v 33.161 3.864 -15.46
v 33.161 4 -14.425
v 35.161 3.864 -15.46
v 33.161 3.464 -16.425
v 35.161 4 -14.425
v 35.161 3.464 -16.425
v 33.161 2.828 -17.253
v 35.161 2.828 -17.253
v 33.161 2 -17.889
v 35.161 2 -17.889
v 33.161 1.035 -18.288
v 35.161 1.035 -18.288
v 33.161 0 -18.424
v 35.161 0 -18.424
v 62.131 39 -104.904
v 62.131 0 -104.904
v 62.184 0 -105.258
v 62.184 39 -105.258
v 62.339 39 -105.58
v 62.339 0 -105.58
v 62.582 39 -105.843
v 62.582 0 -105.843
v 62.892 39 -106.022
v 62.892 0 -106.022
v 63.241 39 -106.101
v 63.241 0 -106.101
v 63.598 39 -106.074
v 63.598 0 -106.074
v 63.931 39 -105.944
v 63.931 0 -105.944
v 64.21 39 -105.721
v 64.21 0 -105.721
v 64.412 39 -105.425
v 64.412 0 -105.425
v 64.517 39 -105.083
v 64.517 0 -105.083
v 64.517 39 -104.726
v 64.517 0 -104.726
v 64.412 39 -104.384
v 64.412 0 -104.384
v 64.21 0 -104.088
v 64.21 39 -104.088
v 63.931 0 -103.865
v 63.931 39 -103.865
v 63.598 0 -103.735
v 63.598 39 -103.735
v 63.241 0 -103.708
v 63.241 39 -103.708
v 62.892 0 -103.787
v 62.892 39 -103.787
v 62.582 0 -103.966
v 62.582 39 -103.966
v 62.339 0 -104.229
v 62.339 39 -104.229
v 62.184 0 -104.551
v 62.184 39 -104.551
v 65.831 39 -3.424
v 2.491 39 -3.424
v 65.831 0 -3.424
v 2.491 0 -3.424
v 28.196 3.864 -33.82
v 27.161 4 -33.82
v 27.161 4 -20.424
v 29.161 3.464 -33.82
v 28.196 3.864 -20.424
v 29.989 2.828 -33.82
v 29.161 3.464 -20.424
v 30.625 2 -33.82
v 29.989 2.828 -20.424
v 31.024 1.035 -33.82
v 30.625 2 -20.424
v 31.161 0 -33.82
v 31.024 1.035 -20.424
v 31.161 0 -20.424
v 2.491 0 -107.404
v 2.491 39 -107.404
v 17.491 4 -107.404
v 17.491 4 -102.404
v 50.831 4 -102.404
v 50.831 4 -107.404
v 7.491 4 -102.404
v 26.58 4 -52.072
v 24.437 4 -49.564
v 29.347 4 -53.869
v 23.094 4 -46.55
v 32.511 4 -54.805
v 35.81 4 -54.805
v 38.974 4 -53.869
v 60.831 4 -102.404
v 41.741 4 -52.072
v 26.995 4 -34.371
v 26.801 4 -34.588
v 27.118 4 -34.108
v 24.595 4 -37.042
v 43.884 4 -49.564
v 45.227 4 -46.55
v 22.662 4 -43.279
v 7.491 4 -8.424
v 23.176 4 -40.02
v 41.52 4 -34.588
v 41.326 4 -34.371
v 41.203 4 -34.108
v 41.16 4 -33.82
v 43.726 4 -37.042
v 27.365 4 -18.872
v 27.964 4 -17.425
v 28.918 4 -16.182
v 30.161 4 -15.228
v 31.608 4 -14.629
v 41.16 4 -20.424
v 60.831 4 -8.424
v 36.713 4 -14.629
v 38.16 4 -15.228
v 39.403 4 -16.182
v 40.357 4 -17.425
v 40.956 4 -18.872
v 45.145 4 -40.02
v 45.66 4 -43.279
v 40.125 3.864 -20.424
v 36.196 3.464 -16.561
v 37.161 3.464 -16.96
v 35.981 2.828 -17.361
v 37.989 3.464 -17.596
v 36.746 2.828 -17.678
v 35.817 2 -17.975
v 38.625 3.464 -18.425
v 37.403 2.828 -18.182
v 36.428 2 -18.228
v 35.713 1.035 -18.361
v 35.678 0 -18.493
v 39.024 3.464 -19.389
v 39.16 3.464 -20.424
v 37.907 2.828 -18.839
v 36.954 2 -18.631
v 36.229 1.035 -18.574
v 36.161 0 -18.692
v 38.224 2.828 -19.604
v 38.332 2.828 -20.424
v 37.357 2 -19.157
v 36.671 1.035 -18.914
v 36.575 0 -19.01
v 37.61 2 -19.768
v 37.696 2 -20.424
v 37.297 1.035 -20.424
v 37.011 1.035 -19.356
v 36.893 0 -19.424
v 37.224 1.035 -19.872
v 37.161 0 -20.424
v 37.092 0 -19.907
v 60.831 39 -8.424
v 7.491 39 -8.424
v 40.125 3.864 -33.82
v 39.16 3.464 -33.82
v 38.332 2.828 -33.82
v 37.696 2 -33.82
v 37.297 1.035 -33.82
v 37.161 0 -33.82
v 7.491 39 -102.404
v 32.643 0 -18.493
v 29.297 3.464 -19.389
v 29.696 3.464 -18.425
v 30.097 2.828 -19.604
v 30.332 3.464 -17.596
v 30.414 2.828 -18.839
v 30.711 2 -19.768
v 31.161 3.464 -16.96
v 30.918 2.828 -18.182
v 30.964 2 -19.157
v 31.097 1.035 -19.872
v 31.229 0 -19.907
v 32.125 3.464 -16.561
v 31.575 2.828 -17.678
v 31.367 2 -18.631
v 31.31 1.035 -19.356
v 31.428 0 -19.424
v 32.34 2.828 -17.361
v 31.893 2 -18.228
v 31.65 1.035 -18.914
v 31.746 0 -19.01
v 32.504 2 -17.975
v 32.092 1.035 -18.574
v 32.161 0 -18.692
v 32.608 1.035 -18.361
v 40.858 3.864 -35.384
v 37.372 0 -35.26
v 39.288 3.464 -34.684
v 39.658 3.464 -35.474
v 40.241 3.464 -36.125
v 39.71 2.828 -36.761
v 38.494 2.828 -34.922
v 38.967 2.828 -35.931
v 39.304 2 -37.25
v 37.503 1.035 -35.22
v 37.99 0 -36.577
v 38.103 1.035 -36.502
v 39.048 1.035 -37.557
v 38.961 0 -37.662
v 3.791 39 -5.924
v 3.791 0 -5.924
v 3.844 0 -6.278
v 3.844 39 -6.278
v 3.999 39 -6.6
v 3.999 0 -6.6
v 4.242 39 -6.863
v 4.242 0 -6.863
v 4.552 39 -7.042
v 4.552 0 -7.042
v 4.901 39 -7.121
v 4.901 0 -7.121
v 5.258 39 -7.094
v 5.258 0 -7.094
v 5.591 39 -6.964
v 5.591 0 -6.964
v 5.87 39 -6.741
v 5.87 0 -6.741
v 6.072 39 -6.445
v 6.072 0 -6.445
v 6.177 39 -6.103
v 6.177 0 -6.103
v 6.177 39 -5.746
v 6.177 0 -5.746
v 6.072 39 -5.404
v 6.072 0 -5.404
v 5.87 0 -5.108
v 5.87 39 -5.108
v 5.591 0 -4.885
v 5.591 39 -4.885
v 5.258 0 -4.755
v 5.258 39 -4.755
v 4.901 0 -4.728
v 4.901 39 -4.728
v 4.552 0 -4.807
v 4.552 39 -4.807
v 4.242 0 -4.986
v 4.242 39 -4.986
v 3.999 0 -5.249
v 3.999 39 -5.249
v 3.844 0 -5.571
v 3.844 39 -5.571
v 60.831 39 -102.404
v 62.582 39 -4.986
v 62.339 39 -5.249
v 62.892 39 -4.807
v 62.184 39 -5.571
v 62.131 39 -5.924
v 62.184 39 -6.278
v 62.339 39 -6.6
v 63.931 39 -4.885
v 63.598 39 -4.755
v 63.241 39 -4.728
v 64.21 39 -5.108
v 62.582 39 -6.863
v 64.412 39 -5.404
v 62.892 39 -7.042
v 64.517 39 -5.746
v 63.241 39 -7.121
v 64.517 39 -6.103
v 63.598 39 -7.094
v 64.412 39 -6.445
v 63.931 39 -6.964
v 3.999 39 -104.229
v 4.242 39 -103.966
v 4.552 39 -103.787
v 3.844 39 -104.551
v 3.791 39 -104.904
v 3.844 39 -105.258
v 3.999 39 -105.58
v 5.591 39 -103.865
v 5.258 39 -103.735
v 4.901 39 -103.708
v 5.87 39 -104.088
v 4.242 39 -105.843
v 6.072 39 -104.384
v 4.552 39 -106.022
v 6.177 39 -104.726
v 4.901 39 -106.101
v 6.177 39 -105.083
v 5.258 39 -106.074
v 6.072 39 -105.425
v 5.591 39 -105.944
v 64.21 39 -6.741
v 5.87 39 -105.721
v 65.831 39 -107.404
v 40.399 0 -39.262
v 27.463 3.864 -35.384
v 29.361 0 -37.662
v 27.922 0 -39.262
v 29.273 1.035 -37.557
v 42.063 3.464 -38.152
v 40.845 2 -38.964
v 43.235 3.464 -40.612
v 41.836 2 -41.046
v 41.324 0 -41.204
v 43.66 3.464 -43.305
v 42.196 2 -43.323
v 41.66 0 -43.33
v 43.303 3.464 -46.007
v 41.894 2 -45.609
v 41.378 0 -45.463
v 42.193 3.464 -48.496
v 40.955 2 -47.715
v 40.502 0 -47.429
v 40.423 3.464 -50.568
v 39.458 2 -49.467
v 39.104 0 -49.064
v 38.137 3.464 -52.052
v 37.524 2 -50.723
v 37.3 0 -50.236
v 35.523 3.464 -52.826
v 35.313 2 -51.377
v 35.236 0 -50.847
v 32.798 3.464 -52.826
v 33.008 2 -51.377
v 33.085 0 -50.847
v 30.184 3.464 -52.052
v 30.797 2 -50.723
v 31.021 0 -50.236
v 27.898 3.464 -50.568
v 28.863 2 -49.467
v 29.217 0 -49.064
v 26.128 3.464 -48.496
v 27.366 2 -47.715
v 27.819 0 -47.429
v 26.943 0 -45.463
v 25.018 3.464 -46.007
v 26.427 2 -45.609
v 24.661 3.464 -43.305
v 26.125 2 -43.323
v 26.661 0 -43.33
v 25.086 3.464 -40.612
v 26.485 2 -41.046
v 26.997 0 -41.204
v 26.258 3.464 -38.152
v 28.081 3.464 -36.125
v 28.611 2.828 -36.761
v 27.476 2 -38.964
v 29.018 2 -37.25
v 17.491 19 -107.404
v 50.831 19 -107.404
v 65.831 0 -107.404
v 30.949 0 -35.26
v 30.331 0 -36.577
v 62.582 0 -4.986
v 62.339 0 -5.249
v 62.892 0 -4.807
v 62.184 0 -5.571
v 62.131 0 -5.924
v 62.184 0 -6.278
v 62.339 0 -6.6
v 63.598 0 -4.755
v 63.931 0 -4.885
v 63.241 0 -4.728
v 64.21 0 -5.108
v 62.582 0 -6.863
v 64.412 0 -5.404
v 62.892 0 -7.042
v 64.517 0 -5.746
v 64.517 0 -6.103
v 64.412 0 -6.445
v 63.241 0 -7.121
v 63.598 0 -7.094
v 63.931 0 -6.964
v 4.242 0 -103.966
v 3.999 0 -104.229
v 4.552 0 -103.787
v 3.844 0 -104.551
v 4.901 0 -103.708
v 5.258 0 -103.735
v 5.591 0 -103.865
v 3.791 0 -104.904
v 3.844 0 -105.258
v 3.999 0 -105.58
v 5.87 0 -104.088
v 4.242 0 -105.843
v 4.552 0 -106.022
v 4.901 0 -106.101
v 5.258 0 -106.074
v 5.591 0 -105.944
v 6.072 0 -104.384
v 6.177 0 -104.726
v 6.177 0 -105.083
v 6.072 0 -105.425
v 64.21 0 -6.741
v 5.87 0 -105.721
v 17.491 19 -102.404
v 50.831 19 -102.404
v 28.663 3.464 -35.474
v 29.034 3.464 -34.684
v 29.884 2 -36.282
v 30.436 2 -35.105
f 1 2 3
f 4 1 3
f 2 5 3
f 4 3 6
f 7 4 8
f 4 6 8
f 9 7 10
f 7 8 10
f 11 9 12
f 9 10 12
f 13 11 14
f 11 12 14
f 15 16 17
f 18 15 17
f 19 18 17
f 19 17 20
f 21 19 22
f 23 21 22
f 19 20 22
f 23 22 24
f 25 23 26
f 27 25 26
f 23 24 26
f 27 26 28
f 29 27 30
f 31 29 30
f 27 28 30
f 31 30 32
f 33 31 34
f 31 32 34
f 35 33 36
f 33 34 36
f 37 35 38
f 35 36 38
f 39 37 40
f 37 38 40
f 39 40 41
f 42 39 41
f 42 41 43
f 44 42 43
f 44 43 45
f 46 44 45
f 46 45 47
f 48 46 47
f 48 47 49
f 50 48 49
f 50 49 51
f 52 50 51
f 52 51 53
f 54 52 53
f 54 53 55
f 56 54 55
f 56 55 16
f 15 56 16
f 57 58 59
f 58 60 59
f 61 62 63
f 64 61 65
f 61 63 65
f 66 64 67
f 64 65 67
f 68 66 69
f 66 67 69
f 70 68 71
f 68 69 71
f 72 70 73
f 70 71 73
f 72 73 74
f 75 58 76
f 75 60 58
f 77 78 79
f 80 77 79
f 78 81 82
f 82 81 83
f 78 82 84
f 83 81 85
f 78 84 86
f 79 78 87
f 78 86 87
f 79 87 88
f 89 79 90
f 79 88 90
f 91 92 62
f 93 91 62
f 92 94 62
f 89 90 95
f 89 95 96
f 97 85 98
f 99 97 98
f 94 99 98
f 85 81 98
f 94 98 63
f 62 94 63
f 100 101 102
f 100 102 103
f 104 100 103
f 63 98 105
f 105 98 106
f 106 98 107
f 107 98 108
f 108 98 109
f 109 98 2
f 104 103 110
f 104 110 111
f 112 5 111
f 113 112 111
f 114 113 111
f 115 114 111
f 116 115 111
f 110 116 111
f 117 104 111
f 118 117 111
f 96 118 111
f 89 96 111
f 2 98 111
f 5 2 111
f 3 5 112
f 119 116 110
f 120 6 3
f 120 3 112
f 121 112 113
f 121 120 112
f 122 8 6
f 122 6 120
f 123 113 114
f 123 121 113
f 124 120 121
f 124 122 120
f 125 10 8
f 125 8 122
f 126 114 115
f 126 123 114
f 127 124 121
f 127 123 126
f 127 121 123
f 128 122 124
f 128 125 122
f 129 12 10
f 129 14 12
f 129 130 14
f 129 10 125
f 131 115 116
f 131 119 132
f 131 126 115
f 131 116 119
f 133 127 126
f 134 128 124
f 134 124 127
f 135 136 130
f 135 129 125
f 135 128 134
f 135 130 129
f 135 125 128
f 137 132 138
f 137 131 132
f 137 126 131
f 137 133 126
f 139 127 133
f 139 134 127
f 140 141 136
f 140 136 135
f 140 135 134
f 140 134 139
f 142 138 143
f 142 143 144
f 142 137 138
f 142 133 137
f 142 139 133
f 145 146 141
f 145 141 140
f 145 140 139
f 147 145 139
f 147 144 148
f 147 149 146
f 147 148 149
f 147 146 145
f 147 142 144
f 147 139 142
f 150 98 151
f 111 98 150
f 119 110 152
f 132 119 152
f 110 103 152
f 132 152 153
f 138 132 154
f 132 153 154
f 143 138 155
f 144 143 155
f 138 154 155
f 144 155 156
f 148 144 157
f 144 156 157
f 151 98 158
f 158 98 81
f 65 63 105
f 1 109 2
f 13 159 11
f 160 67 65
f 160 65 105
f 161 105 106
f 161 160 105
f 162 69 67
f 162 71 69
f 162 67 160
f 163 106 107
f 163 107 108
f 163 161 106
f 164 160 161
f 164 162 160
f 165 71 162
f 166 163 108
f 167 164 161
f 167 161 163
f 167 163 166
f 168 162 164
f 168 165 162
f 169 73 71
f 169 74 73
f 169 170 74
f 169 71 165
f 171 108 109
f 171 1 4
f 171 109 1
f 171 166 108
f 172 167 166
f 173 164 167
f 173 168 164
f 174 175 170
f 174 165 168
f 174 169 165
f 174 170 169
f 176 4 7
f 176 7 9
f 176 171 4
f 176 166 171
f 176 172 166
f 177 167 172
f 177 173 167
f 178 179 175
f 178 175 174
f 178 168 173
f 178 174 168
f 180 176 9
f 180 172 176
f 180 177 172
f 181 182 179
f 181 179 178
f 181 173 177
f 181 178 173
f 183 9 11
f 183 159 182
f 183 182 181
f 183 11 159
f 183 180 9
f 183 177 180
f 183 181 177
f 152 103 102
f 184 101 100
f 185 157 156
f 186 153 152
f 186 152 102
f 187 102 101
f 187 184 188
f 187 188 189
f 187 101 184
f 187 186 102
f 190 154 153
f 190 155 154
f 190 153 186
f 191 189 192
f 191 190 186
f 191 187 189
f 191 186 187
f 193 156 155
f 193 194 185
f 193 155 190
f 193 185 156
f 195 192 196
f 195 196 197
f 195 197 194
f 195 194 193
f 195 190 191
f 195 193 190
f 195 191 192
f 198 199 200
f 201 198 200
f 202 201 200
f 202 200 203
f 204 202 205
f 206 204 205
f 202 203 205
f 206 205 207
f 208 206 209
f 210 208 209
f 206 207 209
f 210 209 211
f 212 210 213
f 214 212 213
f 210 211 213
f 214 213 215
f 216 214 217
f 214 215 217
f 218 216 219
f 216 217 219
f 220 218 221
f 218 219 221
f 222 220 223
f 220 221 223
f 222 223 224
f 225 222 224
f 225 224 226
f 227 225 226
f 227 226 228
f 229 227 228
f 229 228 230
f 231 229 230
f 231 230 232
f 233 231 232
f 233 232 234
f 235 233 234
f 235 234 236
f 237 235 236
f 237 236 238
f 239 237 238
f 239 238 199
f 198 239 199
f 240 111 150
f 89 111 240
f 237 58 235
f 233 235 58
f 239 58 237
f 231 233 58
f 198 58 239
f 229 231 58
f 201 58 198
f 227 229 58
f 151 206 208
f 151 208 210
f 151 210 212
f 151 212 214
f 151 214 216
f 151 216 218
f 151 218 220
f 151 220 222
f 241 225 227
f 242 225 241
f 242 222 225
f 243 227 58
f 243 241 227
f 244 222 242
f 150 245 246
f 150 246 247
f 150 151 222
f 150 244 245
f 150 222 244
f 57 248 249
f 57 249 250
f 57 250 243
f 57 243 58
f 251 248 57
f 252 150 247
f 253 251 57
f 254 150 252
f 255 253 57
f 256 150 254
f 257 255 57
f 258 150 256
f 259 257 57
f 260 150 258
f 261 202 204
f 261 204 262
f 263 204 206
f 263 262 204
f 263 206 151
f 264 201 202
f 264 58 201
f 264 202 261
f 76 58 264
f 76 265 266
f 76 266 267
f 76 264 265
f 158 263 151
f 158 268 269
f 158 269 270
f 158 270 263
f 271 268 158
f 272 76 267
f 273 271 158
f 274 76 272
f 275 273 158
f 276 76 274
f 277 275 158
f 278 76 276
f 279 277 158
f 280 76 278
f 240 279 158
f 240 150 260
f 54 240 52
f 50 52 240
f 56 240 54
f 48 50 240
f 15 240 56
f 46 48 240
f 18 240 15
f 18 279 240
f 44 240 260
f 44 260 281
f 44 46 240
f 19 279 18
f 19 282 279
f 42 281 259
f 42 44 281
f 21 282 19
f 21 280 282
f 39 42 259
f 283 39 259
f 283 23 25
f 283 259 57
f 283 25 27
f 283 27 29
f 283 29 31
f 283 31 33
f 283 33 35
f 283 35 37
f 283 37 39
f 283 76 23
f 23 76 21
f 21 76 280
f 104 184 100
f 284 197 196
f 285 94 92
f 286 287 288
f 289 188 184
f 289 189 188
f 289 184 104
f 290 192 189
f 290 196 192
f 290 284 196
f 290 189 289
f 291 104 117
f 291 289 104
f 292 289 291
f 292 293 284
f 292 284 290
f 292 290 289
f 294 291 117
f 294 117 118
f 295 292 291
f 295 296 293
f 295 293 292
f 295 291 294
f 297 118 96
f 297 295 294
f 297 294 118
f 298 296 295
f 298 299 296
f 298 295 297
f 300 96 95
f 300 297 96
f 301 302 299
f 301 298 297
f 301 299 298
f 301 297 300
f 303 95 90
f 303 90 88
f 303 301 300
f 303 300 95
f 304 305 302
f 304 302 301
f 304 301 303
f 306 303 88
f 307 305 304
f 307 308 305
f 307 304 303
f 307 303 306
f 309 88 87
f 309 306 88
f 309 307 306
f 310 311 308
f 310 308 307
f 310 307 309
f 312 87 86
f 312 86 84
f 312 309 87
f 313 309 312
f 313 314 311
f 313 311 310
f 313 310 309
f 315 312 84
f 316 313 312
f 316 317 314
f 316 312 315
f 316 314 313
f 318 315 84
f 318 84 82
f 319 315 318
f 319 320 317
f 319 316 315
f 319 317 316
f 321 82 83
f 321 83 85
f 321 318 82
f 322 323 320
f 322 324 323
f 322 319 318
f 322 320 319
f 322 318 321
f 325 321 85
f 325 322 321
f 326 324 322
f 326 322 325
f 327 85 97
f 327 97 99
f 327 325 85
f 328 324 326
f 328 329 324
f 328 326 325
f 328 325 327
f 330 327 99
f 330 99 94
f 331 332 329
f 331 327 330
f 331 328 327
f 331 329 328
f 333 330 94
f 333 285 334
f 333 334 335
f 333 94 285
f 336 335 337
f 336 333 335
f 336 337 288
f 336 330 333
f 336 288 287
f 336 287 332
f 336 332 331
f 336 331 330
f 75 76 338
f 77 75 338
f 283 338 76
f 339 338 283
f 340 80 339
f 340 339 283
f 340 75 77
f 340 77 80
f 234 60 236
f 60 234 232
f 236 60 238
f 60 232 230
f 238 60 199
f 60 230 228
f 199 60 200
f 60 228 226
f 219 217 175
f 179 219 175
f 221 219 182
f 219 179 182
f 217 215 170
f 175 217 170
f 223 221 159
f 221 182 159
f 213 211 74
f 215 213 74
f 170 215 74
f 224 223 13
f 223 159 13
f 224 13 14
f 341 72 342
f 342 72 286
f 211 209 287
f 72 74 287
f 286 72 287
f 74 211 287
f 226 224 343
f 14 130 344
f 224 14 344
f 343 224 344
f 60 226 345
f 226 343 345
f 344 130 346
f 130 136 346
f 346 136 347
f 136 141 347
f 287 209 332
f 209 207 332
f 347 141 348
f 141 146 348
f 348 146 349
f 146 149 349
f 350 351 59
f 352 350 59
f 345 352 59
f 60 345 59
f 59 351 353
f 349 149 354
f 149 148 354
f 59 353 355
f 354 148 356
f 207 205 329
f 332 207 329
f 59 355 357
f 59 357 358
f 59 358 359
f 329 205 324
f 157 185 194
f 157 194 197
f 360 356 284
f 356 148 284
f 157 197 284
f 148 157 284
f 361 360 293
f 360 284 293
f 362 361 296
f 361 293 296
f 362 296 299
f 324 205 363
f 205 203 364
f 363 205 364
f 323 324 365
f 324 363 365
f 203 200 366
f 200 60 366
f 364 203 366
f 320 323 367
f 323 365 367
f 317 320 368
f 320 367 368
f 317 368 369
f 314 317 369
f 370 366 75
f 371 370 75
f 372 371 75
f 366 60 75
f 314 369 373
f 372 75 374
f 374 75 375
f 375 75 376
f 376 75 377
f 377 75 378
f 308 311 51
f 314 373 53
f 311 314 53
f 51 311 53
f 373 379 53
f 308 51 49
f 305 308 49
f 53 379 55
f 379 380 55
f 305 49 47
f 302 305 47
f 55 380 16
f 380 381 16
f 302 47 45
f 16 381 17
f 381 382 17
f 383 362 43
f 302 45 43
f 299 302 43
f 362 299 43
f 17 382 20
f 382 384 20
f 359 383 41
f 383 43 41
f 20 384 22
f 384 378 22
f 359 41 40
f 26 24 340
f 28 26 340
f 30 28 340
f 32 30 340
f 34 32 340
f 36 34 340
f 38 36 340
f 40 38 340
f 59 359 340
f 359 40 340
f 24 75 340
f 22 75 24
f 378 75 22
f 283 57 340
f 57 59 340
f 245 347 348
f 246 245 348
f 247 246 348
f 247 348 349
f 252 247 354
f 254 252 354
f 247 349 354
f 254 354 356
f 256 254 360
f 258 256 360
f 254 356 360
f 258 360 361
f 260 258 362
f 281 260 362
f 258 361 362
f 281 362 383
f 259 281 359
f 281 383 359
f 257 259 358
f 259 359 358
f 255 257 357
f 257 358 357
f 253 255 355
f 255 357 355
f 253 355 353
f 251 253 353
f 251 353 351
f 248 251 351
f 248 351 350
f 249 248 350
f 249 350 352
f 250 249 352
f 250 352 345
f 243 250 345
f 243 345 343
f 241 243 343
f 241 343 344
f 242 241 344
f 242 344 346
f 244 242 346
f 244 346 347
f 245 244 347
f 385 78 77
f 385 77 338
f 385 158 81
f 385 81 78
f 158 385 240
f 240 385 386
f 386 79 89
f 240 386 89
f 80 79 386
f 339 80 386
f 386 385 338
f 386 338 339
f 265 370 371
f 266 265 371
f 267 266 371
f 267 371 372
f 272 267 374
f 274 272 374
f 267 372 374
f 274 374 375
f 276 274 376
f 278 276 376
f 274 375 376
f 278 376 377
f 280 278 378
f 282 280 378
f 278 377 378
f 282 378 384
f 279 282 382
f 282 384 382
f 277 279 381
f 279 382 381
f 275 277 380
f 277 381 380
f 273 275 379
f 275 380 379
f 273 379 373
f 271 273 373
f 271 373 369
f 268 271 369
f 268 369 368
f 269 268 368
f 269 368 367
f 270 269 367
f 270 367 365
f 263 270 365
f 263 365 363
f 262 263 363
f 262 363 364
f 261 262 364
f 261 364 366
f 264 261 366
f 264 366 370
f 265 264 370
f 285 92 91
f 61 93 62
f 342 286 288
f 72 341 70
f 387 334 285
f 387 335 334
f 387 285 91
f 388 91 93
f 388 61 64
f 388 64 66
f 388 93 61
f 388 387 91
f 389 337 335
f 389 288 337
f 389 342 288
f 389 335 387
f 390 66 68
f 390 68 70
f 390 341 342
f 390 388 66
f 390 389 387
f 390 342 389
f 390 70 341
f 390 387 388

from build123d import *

# Parameters (mm, degrees)
SCHIZZO1_W                   = 63.34
SCHIZZO1_H                   = 103.98
ESTRUSIONE_ESTRUSIONE1_DEPTH = 4
SCHIZZO2_W                   = 63.34
SCHIZZO2_H                   = 103.98
SCHIZZO2_W_2                 = 53.34
SCHIZZO2_H_2                 = 93.98
ESTRUSIONE_ESTRUSIONE2_DEPTH = 35
FORO_PER_VITE_M2_1_D         = 2.4
SCHIZZO5_W                   = 33.34
SCHIZZO5_H                   = 15
TAGLIO_ESTRUSIONE1_DEPTH     = 126.106755432
TAGLIO_ESTRUSIONE2_DEPTH     = 132.87260726
RACCORDO1_R                  = 4


with BuildPart() as part:
    # Schizzo1 → Estrusione-Estrusione1 (new body)
    with BuildSketch(Plane(origin=(0, 0, 0), x_dir=(1, 0, 0), z_dir=(0, 1, 0))):
        with Locations((34.160538922, 55.414491018)):
            Rectangle(SCHIZZO1_W, SCHIZZO1_H)
    extrude(amount=ESTRUSIONE_ESTRUSIONE1_DEPTH)

    # Schizzo2 → Estrusione-Estrusione2 (add)
    with BuildSketch(Plane(origin=(0, 4, 0), x_dir=(1, 0, 0), z_dir=(0, 1, 0))):
        with Locations((34.160538922, 55.414491018)):
            Rectangle(SCHIZZO2_W, SCHIZZO2_H)
        with Locations((34.160538922, 55.414491018)):
            Rectangle(SCHIZZO2_W_2, SCHIZZO2_H_2, mode=Mode.SUBTRACT)
    extrude(amount=ESTRUSIONE_ESTRUSIONE2_DEPTH)

    # Foro per Vite M2-1 (through all)
    with Locations(Plane(origin=(0, 39, 0), x_dir=(1, 0, 0), z_dir=(0, 1, 0))):
        with Locations((4.990538922, 104.904491018), (63.330538922, 104.904491018), (63.330538922, 5.924491018), (4.990538922, 5.924491018)):
            Hole(FORO_PER_VITE_M2_1_D / 2)

    # Schizzo5 → Taglio-Estrusione1 (cut, through all)
    with BuildSketch(Plane.XY.offset(-102.404491018)):
        with Locations((34.160538922, 11.5)):
            Rectangle(SCHIZZO5_W, SCHIZZO5_H)
    extrude(amount=-TAGLIO_ESTRUSIONE1_DEPTH, mode=Mode.SUBTRACT)

    # Schizzo6 → Taglio-Estrusione2 (cut, through all)
    with BuildSketch(Plane(origin=(0, 0, 0), x_dir=(-1, 0, 0), z_dir=(0, -1, 0))):
        with BuildLine():
            Line((-31.160538922, 33.819804662), (-31.160538922, 20.424491018))
            ThreePointArc((-31.160538922, 20.424491018), (-31.74632536, 19.010277456), (-33.160538922, 18.424491018))
            Line((-33.160538922, 18.424491018), (-35.160538922, 18.424491018))
            ThreePointArc((-35.160538922, 18.424491018), (-36.574752485, 19.010277456), (-37.160538922, 20.424491018))
            Line((-37.160538922, 20.424491018), (-37.160538922, 33.819804662))
            ThreePointArc((-37.160538922, 33.819804662), (-37.632846353, 35.941125005), (-38.960538922, 37.661679204))
            ThreePointArc((-38.960538922, 37.661679204), (-34.160538922, 50.924491018), (-29.360538922, 37.661679204))
            ThreePointArc((-29.360538922, 37.661679204), (-30.688231491, 35.941125005), (-31.160538922, 33.819804662))
        make_face()
    extrude(amount=-TAGLIO_ESTRUSIONE2_DEPTH, mode=Mode.SUBTRACT)

    # Raccordo1
    raccordo1_edges = [part.edges().sort_by_distance(p)[0] for p in [
        (30.688231491, 4, -35.941125005),
        (31.160538922, 4, -27.12214784),
        (31.74632536, 4, -19.010277456),
        (34.160538922, 4, -18.424491018),
        (36.574752485, 4, -19.010277456),
        (37.160538922, 4, -27.12214784),
        (37.632846353, 4, -35.941125005),
        (34.160538922, 4, -50.924491018),
    ]]
    fillet(raccordo1_edges, radius=RACCORDO1_R - 0.0001)  # a hair under: the kernel refuses the full size


solid = part.part
